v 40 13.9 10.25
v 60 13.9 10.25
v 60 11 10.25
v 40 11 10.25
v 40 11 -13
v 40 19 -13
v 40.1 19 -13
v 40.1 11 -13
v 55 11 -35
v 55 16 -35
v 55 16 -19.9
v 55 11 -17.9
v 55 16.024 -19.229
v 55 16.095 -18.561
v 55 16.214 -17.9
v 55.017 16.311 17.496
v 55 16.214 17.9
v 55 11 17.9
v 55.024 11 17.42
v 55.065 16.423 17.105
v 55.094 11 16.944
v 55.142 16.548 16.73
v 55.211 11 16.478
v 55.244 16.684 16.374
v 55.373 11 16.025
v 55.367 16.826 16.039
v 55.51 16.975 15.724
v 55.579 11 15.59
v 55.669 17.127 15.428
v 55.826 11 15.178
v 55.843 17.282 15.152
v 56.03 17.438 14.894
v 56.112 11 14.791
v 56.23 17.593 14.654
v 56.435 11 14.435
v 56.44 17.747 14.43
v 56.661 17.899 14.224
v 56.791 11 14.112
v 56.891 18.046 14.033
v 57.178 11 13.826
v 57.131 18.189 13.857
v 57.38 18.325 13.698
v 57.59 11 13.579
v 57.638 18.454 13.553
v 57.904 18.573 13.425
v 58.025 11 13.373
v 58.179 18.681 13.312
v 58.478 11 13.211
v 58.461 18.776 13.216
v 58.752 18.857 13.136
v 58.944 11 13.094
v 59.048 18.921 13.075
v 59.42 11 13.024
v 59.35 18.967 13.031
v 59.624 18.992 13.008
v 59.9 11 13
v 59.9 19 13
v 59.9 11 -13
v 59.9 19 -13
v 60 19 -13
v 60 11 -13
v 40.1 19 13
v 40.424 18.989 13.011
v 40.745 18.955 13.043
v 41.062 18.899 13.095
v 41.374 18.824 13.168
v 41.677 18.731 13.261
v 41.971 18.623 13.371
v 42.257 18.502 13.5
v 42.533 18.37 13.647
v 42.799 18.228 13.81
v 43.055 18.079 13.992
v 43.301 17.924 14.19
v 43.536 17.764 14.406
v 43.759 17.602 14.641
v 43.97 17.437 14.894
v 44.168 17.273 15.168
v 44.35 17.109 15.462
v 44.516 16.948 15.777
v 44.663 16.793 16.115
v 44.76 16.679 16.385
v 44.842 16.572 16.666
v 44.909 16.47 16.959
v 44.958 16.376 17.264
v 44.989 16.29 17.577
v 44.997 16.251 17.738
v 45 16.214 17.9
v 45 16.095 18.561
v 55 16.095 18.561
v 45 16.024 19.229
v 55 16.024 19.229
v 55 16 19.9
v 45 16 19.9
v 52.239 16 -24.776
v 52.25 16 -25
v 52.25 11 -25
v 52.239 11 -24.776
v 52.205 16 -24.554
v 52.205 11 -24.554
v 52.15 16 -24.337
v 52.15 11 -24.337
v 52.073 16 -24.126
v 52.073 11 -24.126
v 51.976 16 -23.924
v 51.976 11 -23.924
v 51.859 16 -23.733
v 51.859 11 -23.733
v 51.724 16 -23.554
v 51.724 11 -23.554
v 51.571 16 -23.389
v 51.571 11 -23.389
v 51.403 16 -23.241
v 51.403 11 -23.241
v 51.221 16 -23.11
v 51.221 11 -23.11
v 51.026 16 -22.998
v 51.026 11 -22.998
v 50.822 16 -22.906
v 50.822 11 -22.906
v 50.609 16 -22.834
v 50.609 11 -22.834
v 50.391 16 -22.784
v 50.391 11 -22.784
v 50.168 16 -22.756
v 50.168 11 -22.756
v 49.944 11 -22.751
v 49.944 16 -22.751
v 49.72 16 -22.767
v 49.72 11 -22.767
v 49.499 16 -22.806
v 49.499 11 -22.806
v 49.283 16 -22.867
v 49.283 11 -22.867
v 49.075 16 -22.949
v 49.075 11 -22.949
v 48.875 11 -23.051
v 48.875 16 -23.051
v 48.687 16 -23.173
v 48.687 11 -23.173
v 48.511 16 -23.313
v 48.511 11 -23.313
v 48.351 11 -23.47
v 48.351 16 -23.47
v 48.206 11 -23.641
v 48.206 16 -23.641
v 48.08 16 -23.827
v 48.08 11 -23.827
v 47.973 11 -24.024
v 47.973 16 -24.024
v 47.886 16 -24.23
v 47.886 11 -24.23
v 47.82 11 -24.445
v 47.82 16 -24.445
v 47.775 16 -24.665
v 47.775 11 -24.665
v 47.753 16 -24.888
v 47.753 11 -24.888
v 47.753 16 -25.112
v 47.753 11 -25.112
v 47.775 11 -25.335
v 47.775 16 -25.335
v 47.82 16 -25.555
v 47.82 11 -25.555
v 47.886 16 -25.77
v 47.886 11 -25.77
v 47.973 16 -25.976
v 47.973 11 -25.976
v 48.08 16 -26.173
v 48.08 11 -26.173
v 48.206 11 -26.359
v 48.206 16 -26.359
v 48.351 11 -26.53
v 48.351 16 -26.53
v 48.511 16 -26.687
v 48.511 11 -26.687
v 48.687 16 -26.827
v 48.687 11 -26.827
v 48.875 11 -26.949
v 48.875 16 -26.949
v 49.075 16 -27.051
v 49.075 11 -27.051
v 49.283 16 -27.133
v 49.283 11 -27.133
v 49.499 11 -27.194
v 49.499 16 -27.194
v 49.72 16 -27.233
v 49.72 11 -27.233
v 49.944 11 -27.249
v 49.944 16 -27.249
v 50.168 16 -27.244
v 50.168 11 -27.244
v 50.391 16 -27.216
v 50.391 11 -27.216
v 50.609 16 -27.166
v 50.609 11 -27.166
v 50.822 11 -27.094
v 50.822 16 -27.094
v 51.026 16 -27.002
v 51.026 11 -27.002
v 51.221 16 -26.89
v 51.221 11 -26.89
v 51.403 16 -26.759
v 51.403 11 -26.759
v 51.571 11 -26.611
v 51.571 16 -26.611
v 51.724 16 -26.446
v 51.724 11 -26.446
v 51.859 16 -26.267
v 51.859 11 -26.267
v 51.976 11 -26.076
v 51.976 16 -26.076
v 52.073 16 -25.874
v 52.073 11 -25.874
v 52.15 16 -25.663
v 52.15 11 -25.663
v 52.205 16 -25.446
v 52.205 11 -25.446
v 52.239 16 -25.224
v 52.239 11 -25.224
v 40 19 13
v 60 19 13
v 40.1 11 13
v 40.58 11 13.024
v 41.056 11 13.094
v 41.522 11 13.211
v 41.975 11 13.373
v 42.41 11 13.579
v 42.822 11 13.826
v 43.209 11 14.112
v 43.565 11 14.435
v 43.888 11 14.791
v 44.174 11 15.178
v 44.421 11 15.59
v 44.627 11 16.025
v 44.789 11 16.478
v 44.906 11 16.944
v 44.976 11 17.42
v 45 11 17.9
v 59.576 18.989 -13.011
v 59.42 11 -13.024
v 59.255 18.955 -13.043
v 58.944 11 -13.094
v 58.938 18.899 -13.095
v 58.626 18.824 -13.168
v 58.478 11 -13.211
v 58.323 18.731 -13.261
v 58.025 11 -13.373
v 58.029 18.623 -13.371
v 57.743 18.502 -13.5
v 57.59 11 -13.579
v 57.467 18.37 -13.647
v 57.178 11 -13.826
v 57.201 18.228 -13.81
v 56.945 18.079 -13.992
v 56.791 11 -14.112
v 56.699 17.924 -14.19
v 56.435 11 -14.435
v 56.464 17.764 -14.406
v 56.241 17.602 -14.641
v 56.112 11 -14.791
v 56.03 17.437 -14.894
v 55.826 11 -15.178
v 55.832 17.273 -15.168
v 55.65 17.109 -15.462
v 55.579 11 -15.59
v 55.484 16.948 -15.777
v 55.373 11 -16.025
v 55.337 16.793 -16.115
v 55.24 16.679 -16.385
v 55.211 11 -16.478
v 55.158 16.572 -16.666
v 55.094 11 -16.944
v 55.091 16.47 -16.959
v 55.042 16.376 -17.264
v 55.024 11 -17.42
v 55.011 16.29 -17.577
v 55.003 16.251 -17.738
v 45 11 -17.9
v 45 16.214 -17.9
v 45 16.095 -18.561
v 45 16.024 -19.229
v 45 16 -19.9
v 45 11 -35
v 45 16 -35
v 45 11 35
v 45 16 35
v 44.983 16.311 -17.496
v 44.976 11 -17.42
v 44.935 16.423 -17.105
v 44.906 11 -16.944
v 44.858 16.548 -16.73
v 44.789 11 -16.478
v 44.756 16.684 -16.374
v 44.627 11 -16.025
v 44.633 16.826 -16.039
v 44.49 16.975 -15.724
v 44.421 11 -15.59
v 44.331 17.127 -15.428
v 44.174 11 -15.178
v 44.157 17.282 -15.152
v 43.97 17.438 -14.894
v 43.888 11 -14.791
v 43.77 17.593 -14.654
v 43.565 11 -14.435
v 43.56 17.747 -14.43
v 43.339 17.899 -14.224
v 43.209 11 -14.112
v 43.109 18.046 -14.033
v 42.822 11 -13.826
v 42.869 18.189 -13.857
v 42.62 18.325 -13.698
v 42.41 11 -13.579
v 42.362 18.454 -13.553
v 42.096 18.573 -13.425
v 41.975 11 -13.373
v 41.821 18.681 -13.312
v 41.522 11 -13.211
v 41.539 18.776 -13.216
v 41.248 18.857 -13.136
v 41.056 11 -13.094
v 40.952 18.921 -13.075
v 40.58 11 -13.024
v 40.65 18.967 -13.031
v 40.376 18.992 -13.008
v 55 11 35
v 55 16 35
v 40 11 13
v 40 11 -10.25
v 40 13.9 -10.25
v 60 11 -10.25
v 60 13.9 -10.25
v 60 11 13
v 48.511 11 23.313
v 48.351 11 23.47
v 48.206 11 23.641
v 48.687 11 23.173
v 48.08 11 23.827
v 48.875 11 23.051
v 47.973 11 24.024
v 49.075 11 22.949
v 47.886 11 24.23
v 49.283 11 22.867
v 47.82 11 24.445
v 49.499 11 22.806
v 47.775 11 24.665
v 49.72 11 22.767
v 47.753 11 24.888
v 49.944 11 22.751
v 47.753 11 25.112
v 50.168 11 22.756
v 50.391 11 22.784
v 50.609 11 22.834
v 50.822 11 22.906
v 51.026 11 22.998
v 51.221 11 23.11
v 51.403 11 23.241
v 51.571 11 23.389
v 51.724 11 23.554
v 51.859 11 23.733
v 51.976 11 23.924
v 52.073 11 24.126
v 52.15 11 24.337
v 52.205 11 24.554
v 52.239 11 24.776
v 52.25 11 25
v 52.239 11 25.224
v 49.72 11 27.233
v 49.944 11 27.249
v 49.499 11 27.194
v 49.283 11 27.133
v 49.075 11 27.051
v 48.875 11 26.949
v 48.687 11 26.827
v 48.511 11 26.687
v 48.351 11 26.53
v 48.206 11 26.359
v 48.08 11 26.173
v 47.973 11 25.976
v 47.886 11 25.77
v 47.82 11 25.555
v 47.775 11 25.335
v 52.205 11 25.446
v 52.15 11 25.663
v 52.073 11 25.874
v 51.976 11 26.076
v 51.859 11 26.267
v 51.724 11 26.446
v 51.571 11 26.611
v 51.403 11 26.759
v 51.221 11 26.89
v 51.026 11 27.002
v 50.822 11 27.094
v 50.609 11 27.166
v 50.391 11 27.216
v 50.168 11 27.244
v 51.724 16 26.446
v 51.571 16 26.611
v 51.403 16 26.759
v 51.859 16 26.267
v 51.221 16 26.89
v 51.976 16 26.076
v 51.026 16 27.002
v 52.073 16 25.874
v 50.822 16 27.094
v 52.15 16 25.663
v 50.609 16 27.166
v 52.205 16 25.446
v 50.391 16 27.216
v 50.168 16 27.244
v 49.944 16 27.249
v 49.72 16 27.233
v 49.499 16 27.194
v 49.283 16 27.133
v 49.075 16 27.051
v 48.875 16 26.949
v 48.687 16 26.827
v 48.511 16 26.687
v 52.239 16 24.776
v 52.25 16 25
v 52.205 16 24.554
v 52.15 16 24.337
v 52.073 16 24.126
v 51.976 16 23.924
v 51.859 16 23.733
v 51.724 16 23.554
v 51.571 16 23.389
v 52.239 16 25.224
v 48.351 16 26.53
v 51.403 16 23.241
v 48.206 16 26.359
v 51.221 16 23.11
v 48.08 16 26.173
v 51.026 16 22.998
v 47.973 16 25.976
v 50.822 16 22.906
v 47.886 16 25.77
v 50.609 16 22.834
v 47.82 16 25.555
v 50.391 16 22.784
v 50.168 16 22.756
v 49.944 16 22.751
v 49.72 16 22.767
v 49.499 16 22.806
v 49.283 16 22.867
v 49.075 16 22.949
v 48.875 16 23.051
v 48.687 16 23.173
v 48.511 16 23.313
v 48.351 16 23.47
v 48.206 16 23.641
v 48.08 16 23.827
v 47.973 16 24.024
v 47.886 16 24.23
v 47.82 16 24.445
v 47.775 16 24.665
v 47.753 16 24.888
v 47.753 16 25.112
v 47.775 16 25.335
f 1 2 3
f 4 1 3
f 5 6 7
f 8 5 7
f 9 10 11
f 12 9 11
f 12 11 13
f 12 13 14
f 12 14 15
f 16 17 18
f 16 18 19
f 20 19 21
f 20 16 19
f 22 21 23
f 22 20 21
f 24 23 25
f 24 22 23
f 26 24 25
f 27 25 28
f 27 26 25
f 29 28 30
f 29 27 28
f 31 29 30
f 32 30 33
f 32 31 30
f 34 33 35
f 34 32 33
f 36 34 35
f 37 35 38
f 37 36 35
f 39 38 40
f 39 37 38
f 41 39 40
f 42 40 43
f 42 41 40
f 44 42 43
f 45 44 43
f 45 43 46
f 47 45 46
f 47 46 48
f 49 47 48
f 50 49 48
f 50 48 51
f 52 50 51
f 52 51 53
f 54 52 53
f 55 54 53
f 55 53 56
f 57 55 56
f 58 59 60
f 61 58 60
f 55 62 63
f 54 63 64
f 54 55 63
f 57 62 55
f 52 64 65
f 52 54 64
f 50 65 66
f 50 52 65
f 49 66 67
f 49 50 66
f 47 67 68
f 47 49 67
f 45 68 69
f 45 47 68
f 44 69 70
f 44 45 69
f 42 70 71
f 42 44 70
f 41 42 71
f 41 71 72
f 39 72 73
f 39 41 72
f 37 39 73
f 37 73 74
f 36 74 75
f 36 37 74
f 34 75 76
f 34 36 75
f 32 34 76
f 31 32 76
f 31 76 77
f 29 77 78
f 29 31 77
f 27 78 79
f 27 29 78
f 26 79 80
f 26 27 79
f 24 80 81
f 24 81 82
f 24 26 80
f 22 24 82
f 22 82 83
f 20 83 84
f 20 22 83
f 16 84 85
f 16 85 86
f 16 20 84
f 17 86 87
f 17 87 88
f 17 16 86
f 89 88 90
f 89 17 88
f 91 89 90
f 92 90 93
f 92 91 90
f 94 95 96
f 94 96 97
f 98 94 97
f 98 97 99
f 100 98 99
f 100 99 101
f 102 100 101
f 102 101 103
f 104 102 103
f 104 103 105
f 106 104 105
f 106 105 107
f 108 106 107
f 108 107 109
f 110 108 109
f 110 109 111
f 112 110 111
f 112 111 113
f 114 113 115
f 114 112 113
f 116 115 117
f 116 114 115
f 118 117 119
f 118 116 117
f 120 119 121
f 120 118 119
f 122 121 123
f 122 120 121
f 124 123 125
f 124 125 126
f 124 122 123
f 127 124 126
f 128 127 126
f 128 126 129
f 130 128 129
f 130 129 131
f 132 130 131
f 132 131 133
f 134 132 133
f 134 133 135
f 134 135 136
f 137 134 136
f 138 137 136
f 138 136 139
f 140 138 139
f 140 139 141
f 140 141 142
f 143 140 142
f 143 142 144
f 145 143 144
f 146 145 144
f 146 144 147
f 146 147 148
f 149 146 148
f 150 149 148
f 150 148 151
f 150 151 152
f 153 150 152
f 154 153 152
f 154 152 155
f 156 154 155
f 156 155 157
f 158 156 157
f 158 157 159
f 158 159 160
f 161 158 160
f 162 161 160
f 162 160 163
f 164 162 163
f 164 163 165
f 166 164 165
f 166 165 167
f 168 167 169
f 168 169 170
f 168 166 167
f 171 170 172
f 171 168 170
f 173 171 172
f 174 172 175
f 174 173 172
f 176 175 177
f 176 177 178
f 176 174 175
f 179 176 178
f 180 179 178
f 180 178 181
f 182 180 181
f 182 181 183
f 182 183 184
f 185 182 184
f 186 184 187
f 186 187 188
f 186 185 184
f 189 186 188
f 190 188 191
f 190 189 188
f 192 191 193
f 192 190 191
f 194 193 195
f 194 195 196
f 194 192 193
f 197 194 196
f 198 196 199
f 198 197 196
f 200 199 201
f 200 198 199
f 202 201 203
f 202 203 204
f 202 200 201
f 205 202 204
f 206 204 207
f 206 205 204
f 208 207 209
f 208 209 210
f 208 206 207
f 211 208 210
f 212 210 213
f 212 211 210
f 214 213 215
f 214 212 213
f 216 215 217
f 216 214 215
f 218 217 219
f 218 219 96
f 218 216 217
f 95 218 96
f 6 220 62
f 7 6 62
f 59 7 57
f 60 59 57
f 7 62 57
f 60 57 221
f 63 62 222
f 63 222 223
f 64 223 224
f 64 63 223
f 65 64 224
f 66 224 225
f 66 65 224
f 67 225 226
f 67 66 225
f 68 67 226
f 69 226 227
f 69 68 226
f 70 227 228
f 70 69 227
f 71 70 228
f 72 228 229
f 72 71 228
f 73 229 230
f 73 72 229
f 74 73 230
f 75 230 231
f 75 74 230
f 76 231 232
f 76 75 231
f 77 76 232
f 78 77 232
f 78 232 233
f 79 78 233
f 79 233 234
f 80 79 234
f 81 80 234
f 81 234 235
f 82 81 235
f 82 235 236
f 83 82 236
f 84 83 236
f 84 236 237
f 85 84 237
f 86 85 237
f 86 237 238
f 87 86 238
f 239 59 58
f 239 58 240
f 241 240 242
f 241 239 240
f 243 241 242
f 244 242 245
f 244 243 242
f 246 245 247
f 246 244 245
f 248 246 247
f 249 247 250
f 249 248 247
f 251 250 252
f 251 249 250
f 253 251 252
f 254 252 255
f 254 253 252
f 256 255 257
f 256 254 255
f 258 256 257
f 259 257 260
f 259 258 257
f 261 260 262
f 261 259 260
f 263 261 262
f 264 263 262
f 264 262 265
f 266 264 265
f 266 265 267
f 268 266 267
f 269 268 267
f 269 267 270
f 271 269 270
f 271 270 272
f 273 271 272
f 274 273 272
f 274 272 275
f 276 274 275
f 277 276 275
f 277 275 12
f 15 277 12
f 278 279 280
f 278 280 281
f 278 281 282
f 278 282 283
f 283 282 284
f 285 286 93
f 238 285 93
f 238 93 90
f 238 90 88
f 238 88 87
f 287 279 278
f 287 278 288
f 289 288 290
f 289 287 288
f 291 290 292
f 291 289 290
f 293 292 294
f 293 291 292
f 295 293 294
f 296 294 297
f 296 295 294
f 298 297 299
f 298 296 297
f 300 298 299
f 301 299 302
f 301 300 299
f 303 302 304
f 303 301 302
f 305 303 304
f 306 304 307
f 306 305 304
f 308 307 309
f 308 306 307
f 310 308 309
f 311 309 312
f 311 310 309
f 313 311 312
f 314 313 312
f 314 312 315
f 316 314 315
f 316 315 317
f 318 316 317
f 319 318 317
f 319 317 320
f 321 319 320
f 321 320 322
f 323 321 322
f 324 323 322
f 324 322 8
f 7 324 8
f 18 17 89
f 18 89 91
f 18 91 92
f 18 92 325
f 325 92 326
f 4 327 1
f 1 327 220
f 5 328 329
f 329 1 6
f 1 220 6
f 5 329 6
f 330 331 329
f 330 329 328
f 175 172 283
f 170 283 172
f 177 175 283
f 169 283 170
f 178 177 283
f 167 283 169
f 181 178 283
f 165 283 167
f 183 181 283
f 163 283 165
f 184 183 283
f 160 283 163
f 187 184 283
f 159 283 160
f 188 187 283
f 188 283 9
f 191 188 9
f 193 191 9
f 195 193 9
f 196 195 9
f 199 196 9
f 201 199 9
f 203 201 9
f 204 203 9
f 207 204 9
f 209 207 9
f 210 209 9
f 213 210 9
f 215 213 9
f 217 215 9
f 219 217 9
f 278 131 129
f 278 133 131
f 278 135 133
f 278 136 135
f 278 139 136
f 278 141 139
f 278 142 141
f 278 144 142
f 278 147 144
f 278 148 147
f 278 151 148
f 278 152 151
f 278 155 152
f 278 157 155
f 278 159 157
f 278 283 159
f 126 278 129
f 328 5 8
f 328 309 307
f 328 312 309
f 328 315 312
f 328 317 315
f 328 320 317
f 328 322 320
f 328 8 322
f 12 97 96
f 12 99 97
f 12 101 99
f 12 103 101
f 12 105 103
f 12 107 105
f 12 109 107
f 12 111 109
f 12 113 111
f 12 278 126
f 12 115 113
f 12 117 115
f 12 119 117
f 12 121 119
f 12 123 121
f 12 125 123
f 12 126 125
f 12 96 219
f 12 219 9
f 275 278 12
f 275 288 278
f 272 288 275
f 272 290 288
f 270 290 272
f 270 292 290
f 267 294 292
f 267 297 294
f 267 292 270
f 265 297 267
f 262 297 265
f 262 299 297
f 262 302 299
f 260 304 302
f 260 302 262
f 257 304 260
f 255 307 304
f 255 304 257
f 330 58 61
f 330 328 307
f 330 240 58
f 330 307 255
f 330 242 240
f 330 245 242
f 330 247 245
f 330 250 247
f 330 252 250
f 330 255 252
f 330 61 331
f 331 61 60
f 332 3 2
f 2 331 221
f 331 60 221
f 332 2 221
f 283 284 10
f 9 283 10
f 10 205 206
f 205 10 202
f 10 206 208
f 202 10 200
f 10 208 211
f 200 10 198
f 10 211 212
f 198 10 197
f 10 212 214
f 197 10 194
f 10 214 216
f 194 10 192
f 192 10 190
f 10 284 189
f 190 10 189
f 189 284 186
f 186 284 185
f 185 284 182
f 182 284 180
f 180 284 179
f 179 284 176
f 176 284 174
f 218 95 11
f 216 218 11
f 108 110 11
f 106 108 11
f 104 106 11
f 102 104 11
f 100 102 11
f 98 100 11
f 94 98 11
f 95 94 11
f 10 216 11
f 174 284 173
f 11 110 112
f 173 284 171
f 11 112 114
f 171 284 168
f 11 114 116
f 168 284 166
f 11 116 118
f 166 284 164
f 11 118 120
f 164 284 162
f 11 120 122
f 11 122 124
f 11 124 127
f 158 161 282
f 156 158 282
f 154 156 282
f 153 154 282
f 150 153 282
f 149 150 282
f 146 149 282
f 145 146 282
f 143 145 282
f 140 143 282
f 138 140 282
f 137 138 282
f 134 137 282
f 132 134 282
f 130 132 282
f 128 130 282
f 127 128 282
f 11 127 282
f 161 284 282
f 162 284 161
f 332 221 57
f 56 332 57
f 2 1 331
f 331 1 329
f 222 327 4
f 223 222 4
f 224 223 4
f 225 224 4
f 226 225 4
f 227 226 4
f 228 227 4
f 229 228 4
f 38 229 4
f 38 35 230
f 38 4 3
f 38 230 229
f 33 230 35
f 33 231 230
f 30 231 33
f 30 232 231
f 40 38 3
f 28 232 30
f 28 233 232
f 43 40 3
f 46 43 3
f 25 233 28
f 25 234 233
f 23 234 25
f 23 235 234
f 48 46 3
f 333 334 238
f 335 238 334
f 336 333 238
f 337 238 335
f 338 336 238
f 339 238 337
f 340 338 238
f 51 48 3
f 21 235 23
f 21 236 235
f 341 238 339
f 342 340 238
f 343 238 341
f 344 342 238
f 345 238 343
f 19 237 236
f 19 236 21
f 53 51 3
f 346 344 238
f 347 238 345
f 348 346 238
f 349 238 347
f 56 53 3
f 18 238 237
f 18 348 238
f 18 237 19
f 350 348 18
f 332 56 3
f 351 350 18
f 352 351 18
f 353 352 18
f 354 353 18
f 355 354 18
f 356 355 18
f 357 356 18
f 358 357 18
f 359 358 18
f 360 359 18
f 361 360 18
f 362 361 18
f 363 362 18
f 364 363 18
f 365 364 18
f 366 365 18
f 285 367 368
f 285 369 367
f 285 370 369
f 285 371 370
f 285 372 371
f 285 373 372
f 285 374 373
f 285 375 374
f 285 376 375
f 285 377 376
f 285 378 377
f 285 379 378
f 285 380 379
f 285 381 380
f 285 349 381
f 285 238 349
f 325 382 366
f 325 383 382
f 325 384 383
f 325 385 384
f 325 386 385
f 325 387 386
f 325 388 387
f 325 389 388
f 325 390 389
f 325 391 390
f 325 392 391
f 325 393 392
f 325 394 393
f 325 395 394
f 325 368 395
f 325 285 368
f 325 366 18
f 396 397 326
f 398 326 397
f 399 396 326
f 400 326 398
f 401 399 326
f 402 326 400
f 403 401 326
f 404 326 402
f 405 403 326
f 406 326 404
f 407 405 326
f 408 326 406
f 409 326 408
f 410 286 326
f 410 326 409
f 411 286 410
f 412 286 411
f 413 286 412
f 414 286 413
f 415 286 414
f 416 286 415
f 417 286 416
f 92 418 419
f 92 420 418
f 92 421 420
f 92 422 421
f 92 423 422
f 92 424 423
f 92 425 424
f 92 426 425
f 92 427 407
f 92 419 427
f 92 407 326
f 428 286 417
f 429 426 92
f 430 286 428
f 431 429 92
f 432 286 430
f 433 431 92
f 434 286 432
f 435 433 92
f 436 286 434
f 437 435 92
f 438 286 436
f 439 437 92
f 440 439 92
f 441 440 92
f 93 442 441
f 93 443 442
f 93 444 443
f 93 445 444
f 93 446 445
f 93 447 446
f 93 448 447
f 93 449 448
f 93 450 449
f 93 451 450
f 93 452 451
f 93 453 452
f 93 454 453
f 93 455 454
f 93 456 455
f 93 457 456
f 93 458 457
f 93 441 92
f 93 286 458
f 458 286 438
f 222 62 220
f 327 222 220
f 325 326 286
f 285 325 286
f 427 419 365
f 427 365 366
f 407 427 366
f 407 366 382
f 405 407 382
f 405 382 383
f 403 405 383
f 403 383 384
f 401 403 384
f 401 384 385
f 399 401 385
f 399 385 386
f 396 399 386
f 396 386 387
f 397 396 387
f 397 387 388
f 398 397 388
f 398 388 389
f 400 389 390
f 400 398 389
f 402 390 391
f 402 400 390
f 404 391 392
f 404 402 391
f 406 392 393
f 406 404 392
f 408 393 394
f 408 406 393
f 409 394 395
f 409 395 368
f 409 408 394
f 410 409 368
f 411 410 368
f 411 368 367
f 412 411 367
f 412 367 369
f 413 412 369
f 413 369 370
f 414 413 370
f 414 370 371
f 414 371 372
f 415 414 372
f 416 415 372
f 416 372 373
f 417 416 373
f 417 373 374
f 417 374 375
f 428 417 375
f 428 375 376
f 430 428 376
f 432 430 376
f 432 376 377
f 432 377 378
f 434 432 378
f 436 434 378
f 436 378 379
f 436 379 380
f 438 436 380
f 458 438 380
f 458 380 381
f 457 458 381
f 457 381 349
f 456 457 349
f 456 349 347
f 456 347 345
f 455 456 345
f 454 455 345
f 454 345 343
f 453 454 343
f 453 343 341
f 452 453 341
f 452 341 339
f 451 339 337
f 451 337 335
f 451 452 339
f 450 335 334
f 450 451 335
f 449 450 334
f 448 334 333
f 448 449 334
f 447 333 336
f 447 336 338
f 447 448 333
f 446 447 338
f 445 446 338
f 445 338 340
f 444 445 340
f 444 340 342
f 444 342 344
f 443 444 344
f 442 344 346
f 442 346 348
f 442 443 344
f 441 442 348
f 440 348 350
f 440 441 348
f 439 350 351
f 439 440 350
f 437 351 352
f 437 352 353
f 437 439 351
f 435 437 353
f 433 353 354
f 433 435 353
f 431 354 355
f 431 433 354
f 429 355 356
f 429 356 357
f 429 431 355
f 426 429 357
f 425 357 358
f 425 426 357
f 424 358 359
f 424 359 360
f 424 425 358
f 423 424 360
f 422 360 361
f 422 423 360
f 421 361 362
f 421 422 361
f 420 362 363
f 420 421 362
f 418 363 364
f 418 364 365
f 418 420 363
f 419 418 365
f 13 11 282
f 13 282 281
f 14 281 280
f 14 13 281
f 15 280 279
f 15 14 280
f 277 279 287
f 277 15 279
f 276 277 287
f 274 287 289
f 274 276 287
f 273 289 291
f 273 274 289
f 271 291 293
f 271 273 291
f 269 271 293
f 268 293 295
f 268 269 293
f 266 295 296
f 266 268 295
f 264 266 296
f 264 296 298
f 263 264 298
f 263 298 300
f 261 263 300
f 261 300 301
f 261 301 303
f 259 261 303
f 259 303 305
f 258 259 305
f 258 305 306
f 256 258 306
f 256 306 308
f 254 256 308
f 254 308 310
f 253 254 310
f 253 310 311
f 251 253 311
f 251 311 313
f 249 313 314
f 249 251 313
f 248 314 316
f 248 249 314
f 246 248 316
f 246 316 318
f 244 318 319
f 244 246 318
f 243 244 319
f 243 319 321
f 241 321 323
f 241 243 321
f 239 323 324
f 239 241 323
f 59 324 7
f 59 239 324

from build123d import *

# Parameters (mm, degrees)
SKETCH009_R          = 2.25
PAD007_DEPTH         = 8
SKETCH010_W          = 20.5
SKETCH010_H          = 2.9
POCKET002_DEPTH      = 20
POCKET003_DEPTH      = 15.001
POCKET003_DEPTH_BACK = 5.001


with BuildPart() as part:
    # Sketch009 → Pad007 (new body)
    with BuildSketch(Plane.XZ):
        with BuildLine():
            Line((40, -13), (40.1, -13))
            ThreePointArc((45, -17.9), (43.564823, -14.435177), (40.1, -13))
            Line((45, -17.9), (45, -35))
            Line((45, -35), (55, -35))
            Line((55, -35), (55, -17.9))
            ThreePointArc((59.9, -13), (56.435177, -14.435177), (55, -17.9))
            Line((59.9, -13), (60, -13))
            Line((60, -13), (60, 13))
            Line((60, 13), (59.9, 13))
            ThreePointArc((55, 17.9), (56.435177, 14.435177), (59.9, 13))
            Line((55, 17.9), (55, 35))
            Line((55, 35), (45, 35))
            Line((45, 35), (45, 17.9))
            ThreePointArc((40.1, 13), (43.564823, 14.435177), (45, 17.9))
            Line((40.1, 13), (40, 13))
            Line((40, 13), (40, -13))
        make_face()
        with Locations((50, -25)):
            Circle(SKETCH009_R, mode=Mode.SUBTRACT)
        with Locations((50, 25)):
            Circle(SKETCH009_R, mode=Mode.SUBTRACT)
    extrude(amount=PAD007_DEPTH)

    # Sketch010 (on Face2 of Pad007) → Pocket002 (cut)
    with BuildSketch(Plane(origin=(40, 0, 0), x_dir=(0, 0, -1), z_dir=(-1, 0, 0))):
        with Locations((0, 6.55)):
            Rectangle(SKETCH010_W, SKETCH010_H)
    extrude(amount=-POCKET002_DEPTH, mode=Mode.SUBTRACT)

    # Sketch011 (on Face13 of Pocket002) → Pocket003 (cut, two sides)
    with BuildSketch(Plane(origin=(45, 0, 0), x_dir=(0, 0, -1), z_dir=(-1, 0, 0))) as pocket003_sk:
        with BuildLine():
            Line((-35, 3), (-19.9, 3))
            ThreePointArc((-13, 0), (-16.138019, 2.217556), (-19.9, 3))
            Line((-35, 0), (-13, 0))
            Line((-35, 3), (-35, 0))
        make_face()
        with BuildLine():
            Line((13, 0), (35, 0))
            Line((35, 0), (35, 3))
            Line((35, 3), (19.9, 3))
            ThreePointArc((19.9, 3), (16.138019, 2.217556), (13, 0))
        make_face()
    extrude(amount=-POCKET003_DEPTH, mode=Mode.SUBTRACT)
    extrude(pocket003_sk.sketch, amount=POCKET003_DEPTH_BACK, mode=Mode.SUBTRACT)


with BuildPart() as part_1:
    # Body005 placement: moved
    add(part.part.moved(Location((0, 19, 0))))


solid = part_1.part
